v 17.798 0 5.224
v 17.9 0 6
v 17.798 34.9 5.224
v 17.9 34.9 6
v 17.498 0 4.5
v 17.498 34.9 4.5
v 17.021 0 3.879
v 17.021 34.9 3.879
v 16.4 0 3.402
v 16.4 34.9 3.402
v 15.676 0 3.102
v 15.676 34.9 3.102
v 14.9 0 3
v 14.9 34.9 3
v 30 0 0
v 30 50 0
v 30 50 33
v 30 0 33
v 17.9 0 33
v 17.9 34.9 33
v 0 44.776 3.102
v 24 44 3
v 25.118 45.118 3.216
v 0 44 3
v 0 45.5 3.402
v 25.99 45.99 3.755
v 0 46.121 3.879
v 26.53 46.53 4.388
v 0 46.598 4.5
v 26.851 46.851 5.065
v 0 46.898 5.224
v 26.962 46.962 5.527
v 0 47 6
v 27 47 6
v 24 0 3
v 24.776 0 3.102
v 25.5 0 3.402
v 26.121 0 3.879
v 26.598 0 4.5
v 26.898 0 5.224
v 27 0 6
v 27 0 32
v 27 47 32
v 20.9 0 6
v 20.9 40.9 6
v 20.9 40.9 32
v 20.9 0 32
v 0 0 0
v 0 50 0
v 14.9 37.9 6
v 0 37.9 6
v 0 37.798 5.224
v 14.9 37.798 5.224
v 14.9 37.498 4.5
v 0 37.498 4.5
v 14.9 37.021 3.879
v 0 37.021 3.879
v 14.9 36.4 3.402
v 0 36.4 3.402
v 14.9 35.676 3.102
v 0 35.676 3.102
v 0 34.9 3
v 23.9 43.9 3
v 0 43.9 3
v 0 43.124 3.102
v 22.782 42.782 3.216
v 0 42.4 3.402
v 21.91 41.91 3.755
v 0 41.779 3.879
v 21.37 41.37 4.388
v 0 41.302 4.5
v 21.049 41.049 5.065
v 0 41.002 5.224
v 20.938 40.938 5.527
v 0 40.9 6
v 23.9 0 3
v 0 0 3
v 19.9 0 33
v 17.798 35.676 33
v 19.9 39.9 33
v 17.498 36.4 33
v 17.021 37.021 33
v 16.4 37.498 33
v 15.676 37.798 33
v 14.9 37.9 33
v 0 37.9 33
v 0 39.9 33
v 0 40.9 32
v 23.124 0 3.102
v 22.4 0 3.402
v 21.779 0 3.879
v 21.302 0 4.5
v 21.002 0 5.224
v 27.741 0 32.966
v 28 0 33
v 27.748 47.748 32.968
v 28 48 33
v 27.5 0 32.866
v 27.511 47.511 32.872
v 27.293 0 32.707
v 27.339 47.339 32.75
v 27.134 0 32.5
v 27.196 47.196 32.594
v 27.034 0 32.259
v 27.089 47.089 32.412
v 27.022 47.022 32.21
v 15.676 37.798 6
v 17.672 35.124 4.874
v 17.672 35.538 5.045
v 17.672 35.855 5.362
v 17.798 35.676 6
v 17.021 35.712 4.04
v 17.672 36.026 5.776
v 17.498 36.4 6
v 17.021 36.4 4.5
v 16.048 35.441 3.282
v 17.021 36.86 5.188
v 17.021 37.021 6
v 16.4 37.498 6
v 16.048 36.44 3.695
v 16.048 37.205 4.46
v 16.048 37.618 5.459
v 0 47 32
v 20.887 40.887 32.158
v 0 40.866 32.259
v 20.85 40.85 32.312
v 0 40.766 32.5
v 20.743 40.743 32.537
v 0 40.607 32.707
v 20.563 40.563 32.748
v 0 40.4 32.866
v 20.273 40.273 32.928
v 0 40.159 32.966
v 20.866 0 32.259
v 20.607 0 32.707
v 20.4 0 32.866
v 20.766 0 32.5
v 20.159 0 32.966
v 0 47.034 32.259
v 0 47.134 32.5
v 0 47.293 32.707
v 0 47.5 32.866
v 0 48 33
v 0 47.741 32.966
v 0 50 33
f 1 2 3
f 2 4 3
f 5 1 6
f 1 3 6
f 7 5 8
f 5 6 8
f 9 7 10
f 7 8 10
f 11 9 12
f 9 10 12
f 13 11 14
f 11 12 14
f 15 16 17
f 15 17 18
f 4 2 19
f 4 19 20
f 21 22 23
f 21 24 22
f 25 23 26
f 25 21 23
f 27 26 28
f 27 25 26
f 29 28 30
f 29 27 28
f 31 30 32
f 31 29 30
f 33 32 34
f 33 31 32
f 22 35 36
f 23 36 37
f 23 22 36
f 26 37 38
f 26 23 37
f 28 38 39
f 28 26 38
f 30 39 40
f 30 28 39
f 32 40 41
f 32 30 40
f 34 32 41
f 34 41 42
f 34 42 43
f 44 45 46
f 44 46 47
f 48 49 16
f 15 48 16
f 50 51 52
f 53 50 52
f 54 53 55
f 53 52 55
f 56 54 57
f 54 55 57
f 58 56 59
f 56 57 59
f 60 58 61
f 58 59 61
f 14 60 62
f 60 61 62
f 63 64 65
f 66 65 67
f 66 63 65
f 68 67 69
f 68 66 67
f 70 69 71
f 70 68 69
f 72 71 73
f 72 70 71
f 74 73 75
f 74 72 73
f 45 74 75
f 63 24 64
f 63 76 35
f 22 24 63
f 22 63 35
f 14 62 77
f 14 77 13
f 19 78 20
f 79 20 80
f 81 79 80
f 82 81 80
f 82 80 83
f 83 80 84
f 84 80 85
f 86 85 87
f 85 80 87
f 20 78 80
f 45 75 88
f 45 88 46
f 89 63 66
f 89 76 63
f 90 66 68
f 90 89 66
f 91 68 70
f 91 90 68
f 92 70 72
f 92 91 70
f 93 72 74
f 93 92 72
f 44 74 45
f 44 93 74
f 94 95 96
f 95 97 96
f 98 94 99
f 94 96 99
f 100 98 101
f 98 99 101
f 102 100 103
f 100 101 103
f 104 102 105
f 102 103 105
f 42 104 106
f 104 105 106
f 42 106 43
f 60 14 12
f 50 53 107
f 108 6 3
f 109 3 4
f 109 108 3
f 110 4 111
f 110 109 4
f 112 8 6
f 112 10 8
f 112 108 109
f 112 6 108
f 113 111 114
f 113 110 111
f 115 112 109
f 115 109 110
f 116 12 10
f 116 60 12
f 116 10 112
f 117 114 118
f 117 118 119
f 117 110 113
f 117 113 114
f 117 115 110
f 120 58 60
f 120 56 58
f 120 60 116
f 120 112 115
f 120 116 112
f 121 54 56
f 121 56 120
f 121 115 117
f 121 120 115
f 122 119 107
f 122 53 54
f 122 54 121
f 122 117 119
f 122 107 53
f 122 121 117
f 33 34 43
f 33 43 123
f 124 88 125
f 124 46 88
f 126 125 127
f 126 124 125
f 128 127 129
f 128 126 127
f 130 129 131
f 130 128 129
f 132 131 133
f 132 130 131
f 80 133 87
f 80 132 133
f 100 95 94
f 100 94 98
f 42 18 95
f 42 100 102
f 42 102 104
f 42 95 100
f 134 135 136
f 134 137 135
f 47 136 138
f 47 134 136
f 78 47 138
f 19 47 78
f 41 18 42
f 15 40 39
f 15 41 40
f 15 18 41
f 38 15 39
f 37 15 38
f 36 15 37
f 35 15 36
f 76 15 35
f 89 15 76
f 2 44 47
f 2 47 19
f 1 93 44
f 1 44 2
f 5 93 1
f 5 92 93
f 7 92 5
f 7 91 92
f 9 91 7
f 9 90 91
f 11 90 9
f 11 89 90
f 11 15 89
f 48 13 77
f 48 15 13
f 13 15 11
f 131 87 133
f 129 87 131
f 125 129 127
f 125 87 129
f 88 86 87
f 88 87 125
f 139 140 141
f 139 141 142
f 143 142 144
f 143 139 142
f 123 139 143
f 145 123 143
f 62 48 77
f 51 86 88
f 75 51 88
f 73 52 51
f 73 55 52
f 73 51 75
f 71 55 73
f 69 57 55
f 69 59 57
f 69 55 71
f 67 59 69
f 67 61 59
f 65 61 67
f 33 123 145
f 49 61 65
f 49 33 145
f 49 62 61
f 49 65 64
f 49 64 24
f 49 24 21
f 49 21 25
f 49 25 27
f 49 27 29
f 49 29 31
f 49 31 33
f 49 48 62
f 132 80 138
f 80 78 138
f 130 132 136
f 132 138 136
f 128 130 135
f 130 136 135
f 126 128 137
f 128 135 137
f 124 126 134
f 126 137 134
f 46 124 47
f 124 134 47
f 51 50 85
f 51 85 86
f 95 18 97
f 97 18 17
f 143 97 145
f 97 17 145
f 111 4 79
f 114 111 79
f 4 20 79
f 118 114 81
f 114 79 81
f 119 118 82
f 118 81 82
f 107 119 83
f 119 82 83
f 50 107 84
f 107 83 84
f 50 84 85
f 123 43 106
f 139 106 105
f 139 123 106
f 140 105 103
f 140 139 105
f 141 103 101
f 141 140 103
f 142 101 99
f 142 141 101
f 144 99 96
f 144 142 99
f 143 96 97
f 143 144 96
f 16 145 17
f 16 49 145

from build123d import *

# Parameters (mm, degrees)
SKETCH1_W           = 30
SKETCH1_H           = 50
BOSS_EXTRUDE1_DEPTH = 3
BOSS_EXTRUDE2_DEPTH = 30
FILLET1_R           = 3
FILLET2_R           = 1


with BuildPart() as part:
    # Sketch1 → Boss-Extrude1 (new body)
    with BuildSketch(Plane.XY):
        with Locations((15, 25)):
            Rectangle(SKETCH1_W, SKETCH1_H)
    extrude(amount=BOSS_EXTRUDE1_DEPTH)

    # Sketch2 → Boss-Extrude2 (add)
    with BuildSketch(Plane.XY.offset(3)):
        Polygon((0, 50), (30, 50), (30, 0), (27, 0), (27, 47), (0, 47), align=None)
        Polygon((0, 40.9), (20.9, 40.9), (20.9, 0), (17.9, 0), (17.9, 37.9), (0, 37.9), align=None)
    extrude(amount=BOSS_EXTRUDE2_DEPTH)

    # Fillet1
    fillet1_edges = [part.edges().sort_by_distance(p)[0] for p in [
        (13.5, 47, 3),
        (27, 23.5, 3),
        (8.95, 37.9, 3),
        (17.9, 18.95, 3),
        (17.9, 37.9, 18),
        (20.9, 20.45, 3),
        (10.45, 40.9, 3),
    ]]
    fillet(fillet1_edges, radius=FILLET1_R)

    # Fillet2
    fillet2_edges = [part.edges().sort_by_distance(p)[0] for p in [
        (13.5, 47, 33),
        (27, 23.5, 33),
        (20.9, 20.45, 33),
        (10.45, 40.9, 33),
    ]]
    fillet(fillet2_edges, radius=FILLET2_R)


solid = part.part
